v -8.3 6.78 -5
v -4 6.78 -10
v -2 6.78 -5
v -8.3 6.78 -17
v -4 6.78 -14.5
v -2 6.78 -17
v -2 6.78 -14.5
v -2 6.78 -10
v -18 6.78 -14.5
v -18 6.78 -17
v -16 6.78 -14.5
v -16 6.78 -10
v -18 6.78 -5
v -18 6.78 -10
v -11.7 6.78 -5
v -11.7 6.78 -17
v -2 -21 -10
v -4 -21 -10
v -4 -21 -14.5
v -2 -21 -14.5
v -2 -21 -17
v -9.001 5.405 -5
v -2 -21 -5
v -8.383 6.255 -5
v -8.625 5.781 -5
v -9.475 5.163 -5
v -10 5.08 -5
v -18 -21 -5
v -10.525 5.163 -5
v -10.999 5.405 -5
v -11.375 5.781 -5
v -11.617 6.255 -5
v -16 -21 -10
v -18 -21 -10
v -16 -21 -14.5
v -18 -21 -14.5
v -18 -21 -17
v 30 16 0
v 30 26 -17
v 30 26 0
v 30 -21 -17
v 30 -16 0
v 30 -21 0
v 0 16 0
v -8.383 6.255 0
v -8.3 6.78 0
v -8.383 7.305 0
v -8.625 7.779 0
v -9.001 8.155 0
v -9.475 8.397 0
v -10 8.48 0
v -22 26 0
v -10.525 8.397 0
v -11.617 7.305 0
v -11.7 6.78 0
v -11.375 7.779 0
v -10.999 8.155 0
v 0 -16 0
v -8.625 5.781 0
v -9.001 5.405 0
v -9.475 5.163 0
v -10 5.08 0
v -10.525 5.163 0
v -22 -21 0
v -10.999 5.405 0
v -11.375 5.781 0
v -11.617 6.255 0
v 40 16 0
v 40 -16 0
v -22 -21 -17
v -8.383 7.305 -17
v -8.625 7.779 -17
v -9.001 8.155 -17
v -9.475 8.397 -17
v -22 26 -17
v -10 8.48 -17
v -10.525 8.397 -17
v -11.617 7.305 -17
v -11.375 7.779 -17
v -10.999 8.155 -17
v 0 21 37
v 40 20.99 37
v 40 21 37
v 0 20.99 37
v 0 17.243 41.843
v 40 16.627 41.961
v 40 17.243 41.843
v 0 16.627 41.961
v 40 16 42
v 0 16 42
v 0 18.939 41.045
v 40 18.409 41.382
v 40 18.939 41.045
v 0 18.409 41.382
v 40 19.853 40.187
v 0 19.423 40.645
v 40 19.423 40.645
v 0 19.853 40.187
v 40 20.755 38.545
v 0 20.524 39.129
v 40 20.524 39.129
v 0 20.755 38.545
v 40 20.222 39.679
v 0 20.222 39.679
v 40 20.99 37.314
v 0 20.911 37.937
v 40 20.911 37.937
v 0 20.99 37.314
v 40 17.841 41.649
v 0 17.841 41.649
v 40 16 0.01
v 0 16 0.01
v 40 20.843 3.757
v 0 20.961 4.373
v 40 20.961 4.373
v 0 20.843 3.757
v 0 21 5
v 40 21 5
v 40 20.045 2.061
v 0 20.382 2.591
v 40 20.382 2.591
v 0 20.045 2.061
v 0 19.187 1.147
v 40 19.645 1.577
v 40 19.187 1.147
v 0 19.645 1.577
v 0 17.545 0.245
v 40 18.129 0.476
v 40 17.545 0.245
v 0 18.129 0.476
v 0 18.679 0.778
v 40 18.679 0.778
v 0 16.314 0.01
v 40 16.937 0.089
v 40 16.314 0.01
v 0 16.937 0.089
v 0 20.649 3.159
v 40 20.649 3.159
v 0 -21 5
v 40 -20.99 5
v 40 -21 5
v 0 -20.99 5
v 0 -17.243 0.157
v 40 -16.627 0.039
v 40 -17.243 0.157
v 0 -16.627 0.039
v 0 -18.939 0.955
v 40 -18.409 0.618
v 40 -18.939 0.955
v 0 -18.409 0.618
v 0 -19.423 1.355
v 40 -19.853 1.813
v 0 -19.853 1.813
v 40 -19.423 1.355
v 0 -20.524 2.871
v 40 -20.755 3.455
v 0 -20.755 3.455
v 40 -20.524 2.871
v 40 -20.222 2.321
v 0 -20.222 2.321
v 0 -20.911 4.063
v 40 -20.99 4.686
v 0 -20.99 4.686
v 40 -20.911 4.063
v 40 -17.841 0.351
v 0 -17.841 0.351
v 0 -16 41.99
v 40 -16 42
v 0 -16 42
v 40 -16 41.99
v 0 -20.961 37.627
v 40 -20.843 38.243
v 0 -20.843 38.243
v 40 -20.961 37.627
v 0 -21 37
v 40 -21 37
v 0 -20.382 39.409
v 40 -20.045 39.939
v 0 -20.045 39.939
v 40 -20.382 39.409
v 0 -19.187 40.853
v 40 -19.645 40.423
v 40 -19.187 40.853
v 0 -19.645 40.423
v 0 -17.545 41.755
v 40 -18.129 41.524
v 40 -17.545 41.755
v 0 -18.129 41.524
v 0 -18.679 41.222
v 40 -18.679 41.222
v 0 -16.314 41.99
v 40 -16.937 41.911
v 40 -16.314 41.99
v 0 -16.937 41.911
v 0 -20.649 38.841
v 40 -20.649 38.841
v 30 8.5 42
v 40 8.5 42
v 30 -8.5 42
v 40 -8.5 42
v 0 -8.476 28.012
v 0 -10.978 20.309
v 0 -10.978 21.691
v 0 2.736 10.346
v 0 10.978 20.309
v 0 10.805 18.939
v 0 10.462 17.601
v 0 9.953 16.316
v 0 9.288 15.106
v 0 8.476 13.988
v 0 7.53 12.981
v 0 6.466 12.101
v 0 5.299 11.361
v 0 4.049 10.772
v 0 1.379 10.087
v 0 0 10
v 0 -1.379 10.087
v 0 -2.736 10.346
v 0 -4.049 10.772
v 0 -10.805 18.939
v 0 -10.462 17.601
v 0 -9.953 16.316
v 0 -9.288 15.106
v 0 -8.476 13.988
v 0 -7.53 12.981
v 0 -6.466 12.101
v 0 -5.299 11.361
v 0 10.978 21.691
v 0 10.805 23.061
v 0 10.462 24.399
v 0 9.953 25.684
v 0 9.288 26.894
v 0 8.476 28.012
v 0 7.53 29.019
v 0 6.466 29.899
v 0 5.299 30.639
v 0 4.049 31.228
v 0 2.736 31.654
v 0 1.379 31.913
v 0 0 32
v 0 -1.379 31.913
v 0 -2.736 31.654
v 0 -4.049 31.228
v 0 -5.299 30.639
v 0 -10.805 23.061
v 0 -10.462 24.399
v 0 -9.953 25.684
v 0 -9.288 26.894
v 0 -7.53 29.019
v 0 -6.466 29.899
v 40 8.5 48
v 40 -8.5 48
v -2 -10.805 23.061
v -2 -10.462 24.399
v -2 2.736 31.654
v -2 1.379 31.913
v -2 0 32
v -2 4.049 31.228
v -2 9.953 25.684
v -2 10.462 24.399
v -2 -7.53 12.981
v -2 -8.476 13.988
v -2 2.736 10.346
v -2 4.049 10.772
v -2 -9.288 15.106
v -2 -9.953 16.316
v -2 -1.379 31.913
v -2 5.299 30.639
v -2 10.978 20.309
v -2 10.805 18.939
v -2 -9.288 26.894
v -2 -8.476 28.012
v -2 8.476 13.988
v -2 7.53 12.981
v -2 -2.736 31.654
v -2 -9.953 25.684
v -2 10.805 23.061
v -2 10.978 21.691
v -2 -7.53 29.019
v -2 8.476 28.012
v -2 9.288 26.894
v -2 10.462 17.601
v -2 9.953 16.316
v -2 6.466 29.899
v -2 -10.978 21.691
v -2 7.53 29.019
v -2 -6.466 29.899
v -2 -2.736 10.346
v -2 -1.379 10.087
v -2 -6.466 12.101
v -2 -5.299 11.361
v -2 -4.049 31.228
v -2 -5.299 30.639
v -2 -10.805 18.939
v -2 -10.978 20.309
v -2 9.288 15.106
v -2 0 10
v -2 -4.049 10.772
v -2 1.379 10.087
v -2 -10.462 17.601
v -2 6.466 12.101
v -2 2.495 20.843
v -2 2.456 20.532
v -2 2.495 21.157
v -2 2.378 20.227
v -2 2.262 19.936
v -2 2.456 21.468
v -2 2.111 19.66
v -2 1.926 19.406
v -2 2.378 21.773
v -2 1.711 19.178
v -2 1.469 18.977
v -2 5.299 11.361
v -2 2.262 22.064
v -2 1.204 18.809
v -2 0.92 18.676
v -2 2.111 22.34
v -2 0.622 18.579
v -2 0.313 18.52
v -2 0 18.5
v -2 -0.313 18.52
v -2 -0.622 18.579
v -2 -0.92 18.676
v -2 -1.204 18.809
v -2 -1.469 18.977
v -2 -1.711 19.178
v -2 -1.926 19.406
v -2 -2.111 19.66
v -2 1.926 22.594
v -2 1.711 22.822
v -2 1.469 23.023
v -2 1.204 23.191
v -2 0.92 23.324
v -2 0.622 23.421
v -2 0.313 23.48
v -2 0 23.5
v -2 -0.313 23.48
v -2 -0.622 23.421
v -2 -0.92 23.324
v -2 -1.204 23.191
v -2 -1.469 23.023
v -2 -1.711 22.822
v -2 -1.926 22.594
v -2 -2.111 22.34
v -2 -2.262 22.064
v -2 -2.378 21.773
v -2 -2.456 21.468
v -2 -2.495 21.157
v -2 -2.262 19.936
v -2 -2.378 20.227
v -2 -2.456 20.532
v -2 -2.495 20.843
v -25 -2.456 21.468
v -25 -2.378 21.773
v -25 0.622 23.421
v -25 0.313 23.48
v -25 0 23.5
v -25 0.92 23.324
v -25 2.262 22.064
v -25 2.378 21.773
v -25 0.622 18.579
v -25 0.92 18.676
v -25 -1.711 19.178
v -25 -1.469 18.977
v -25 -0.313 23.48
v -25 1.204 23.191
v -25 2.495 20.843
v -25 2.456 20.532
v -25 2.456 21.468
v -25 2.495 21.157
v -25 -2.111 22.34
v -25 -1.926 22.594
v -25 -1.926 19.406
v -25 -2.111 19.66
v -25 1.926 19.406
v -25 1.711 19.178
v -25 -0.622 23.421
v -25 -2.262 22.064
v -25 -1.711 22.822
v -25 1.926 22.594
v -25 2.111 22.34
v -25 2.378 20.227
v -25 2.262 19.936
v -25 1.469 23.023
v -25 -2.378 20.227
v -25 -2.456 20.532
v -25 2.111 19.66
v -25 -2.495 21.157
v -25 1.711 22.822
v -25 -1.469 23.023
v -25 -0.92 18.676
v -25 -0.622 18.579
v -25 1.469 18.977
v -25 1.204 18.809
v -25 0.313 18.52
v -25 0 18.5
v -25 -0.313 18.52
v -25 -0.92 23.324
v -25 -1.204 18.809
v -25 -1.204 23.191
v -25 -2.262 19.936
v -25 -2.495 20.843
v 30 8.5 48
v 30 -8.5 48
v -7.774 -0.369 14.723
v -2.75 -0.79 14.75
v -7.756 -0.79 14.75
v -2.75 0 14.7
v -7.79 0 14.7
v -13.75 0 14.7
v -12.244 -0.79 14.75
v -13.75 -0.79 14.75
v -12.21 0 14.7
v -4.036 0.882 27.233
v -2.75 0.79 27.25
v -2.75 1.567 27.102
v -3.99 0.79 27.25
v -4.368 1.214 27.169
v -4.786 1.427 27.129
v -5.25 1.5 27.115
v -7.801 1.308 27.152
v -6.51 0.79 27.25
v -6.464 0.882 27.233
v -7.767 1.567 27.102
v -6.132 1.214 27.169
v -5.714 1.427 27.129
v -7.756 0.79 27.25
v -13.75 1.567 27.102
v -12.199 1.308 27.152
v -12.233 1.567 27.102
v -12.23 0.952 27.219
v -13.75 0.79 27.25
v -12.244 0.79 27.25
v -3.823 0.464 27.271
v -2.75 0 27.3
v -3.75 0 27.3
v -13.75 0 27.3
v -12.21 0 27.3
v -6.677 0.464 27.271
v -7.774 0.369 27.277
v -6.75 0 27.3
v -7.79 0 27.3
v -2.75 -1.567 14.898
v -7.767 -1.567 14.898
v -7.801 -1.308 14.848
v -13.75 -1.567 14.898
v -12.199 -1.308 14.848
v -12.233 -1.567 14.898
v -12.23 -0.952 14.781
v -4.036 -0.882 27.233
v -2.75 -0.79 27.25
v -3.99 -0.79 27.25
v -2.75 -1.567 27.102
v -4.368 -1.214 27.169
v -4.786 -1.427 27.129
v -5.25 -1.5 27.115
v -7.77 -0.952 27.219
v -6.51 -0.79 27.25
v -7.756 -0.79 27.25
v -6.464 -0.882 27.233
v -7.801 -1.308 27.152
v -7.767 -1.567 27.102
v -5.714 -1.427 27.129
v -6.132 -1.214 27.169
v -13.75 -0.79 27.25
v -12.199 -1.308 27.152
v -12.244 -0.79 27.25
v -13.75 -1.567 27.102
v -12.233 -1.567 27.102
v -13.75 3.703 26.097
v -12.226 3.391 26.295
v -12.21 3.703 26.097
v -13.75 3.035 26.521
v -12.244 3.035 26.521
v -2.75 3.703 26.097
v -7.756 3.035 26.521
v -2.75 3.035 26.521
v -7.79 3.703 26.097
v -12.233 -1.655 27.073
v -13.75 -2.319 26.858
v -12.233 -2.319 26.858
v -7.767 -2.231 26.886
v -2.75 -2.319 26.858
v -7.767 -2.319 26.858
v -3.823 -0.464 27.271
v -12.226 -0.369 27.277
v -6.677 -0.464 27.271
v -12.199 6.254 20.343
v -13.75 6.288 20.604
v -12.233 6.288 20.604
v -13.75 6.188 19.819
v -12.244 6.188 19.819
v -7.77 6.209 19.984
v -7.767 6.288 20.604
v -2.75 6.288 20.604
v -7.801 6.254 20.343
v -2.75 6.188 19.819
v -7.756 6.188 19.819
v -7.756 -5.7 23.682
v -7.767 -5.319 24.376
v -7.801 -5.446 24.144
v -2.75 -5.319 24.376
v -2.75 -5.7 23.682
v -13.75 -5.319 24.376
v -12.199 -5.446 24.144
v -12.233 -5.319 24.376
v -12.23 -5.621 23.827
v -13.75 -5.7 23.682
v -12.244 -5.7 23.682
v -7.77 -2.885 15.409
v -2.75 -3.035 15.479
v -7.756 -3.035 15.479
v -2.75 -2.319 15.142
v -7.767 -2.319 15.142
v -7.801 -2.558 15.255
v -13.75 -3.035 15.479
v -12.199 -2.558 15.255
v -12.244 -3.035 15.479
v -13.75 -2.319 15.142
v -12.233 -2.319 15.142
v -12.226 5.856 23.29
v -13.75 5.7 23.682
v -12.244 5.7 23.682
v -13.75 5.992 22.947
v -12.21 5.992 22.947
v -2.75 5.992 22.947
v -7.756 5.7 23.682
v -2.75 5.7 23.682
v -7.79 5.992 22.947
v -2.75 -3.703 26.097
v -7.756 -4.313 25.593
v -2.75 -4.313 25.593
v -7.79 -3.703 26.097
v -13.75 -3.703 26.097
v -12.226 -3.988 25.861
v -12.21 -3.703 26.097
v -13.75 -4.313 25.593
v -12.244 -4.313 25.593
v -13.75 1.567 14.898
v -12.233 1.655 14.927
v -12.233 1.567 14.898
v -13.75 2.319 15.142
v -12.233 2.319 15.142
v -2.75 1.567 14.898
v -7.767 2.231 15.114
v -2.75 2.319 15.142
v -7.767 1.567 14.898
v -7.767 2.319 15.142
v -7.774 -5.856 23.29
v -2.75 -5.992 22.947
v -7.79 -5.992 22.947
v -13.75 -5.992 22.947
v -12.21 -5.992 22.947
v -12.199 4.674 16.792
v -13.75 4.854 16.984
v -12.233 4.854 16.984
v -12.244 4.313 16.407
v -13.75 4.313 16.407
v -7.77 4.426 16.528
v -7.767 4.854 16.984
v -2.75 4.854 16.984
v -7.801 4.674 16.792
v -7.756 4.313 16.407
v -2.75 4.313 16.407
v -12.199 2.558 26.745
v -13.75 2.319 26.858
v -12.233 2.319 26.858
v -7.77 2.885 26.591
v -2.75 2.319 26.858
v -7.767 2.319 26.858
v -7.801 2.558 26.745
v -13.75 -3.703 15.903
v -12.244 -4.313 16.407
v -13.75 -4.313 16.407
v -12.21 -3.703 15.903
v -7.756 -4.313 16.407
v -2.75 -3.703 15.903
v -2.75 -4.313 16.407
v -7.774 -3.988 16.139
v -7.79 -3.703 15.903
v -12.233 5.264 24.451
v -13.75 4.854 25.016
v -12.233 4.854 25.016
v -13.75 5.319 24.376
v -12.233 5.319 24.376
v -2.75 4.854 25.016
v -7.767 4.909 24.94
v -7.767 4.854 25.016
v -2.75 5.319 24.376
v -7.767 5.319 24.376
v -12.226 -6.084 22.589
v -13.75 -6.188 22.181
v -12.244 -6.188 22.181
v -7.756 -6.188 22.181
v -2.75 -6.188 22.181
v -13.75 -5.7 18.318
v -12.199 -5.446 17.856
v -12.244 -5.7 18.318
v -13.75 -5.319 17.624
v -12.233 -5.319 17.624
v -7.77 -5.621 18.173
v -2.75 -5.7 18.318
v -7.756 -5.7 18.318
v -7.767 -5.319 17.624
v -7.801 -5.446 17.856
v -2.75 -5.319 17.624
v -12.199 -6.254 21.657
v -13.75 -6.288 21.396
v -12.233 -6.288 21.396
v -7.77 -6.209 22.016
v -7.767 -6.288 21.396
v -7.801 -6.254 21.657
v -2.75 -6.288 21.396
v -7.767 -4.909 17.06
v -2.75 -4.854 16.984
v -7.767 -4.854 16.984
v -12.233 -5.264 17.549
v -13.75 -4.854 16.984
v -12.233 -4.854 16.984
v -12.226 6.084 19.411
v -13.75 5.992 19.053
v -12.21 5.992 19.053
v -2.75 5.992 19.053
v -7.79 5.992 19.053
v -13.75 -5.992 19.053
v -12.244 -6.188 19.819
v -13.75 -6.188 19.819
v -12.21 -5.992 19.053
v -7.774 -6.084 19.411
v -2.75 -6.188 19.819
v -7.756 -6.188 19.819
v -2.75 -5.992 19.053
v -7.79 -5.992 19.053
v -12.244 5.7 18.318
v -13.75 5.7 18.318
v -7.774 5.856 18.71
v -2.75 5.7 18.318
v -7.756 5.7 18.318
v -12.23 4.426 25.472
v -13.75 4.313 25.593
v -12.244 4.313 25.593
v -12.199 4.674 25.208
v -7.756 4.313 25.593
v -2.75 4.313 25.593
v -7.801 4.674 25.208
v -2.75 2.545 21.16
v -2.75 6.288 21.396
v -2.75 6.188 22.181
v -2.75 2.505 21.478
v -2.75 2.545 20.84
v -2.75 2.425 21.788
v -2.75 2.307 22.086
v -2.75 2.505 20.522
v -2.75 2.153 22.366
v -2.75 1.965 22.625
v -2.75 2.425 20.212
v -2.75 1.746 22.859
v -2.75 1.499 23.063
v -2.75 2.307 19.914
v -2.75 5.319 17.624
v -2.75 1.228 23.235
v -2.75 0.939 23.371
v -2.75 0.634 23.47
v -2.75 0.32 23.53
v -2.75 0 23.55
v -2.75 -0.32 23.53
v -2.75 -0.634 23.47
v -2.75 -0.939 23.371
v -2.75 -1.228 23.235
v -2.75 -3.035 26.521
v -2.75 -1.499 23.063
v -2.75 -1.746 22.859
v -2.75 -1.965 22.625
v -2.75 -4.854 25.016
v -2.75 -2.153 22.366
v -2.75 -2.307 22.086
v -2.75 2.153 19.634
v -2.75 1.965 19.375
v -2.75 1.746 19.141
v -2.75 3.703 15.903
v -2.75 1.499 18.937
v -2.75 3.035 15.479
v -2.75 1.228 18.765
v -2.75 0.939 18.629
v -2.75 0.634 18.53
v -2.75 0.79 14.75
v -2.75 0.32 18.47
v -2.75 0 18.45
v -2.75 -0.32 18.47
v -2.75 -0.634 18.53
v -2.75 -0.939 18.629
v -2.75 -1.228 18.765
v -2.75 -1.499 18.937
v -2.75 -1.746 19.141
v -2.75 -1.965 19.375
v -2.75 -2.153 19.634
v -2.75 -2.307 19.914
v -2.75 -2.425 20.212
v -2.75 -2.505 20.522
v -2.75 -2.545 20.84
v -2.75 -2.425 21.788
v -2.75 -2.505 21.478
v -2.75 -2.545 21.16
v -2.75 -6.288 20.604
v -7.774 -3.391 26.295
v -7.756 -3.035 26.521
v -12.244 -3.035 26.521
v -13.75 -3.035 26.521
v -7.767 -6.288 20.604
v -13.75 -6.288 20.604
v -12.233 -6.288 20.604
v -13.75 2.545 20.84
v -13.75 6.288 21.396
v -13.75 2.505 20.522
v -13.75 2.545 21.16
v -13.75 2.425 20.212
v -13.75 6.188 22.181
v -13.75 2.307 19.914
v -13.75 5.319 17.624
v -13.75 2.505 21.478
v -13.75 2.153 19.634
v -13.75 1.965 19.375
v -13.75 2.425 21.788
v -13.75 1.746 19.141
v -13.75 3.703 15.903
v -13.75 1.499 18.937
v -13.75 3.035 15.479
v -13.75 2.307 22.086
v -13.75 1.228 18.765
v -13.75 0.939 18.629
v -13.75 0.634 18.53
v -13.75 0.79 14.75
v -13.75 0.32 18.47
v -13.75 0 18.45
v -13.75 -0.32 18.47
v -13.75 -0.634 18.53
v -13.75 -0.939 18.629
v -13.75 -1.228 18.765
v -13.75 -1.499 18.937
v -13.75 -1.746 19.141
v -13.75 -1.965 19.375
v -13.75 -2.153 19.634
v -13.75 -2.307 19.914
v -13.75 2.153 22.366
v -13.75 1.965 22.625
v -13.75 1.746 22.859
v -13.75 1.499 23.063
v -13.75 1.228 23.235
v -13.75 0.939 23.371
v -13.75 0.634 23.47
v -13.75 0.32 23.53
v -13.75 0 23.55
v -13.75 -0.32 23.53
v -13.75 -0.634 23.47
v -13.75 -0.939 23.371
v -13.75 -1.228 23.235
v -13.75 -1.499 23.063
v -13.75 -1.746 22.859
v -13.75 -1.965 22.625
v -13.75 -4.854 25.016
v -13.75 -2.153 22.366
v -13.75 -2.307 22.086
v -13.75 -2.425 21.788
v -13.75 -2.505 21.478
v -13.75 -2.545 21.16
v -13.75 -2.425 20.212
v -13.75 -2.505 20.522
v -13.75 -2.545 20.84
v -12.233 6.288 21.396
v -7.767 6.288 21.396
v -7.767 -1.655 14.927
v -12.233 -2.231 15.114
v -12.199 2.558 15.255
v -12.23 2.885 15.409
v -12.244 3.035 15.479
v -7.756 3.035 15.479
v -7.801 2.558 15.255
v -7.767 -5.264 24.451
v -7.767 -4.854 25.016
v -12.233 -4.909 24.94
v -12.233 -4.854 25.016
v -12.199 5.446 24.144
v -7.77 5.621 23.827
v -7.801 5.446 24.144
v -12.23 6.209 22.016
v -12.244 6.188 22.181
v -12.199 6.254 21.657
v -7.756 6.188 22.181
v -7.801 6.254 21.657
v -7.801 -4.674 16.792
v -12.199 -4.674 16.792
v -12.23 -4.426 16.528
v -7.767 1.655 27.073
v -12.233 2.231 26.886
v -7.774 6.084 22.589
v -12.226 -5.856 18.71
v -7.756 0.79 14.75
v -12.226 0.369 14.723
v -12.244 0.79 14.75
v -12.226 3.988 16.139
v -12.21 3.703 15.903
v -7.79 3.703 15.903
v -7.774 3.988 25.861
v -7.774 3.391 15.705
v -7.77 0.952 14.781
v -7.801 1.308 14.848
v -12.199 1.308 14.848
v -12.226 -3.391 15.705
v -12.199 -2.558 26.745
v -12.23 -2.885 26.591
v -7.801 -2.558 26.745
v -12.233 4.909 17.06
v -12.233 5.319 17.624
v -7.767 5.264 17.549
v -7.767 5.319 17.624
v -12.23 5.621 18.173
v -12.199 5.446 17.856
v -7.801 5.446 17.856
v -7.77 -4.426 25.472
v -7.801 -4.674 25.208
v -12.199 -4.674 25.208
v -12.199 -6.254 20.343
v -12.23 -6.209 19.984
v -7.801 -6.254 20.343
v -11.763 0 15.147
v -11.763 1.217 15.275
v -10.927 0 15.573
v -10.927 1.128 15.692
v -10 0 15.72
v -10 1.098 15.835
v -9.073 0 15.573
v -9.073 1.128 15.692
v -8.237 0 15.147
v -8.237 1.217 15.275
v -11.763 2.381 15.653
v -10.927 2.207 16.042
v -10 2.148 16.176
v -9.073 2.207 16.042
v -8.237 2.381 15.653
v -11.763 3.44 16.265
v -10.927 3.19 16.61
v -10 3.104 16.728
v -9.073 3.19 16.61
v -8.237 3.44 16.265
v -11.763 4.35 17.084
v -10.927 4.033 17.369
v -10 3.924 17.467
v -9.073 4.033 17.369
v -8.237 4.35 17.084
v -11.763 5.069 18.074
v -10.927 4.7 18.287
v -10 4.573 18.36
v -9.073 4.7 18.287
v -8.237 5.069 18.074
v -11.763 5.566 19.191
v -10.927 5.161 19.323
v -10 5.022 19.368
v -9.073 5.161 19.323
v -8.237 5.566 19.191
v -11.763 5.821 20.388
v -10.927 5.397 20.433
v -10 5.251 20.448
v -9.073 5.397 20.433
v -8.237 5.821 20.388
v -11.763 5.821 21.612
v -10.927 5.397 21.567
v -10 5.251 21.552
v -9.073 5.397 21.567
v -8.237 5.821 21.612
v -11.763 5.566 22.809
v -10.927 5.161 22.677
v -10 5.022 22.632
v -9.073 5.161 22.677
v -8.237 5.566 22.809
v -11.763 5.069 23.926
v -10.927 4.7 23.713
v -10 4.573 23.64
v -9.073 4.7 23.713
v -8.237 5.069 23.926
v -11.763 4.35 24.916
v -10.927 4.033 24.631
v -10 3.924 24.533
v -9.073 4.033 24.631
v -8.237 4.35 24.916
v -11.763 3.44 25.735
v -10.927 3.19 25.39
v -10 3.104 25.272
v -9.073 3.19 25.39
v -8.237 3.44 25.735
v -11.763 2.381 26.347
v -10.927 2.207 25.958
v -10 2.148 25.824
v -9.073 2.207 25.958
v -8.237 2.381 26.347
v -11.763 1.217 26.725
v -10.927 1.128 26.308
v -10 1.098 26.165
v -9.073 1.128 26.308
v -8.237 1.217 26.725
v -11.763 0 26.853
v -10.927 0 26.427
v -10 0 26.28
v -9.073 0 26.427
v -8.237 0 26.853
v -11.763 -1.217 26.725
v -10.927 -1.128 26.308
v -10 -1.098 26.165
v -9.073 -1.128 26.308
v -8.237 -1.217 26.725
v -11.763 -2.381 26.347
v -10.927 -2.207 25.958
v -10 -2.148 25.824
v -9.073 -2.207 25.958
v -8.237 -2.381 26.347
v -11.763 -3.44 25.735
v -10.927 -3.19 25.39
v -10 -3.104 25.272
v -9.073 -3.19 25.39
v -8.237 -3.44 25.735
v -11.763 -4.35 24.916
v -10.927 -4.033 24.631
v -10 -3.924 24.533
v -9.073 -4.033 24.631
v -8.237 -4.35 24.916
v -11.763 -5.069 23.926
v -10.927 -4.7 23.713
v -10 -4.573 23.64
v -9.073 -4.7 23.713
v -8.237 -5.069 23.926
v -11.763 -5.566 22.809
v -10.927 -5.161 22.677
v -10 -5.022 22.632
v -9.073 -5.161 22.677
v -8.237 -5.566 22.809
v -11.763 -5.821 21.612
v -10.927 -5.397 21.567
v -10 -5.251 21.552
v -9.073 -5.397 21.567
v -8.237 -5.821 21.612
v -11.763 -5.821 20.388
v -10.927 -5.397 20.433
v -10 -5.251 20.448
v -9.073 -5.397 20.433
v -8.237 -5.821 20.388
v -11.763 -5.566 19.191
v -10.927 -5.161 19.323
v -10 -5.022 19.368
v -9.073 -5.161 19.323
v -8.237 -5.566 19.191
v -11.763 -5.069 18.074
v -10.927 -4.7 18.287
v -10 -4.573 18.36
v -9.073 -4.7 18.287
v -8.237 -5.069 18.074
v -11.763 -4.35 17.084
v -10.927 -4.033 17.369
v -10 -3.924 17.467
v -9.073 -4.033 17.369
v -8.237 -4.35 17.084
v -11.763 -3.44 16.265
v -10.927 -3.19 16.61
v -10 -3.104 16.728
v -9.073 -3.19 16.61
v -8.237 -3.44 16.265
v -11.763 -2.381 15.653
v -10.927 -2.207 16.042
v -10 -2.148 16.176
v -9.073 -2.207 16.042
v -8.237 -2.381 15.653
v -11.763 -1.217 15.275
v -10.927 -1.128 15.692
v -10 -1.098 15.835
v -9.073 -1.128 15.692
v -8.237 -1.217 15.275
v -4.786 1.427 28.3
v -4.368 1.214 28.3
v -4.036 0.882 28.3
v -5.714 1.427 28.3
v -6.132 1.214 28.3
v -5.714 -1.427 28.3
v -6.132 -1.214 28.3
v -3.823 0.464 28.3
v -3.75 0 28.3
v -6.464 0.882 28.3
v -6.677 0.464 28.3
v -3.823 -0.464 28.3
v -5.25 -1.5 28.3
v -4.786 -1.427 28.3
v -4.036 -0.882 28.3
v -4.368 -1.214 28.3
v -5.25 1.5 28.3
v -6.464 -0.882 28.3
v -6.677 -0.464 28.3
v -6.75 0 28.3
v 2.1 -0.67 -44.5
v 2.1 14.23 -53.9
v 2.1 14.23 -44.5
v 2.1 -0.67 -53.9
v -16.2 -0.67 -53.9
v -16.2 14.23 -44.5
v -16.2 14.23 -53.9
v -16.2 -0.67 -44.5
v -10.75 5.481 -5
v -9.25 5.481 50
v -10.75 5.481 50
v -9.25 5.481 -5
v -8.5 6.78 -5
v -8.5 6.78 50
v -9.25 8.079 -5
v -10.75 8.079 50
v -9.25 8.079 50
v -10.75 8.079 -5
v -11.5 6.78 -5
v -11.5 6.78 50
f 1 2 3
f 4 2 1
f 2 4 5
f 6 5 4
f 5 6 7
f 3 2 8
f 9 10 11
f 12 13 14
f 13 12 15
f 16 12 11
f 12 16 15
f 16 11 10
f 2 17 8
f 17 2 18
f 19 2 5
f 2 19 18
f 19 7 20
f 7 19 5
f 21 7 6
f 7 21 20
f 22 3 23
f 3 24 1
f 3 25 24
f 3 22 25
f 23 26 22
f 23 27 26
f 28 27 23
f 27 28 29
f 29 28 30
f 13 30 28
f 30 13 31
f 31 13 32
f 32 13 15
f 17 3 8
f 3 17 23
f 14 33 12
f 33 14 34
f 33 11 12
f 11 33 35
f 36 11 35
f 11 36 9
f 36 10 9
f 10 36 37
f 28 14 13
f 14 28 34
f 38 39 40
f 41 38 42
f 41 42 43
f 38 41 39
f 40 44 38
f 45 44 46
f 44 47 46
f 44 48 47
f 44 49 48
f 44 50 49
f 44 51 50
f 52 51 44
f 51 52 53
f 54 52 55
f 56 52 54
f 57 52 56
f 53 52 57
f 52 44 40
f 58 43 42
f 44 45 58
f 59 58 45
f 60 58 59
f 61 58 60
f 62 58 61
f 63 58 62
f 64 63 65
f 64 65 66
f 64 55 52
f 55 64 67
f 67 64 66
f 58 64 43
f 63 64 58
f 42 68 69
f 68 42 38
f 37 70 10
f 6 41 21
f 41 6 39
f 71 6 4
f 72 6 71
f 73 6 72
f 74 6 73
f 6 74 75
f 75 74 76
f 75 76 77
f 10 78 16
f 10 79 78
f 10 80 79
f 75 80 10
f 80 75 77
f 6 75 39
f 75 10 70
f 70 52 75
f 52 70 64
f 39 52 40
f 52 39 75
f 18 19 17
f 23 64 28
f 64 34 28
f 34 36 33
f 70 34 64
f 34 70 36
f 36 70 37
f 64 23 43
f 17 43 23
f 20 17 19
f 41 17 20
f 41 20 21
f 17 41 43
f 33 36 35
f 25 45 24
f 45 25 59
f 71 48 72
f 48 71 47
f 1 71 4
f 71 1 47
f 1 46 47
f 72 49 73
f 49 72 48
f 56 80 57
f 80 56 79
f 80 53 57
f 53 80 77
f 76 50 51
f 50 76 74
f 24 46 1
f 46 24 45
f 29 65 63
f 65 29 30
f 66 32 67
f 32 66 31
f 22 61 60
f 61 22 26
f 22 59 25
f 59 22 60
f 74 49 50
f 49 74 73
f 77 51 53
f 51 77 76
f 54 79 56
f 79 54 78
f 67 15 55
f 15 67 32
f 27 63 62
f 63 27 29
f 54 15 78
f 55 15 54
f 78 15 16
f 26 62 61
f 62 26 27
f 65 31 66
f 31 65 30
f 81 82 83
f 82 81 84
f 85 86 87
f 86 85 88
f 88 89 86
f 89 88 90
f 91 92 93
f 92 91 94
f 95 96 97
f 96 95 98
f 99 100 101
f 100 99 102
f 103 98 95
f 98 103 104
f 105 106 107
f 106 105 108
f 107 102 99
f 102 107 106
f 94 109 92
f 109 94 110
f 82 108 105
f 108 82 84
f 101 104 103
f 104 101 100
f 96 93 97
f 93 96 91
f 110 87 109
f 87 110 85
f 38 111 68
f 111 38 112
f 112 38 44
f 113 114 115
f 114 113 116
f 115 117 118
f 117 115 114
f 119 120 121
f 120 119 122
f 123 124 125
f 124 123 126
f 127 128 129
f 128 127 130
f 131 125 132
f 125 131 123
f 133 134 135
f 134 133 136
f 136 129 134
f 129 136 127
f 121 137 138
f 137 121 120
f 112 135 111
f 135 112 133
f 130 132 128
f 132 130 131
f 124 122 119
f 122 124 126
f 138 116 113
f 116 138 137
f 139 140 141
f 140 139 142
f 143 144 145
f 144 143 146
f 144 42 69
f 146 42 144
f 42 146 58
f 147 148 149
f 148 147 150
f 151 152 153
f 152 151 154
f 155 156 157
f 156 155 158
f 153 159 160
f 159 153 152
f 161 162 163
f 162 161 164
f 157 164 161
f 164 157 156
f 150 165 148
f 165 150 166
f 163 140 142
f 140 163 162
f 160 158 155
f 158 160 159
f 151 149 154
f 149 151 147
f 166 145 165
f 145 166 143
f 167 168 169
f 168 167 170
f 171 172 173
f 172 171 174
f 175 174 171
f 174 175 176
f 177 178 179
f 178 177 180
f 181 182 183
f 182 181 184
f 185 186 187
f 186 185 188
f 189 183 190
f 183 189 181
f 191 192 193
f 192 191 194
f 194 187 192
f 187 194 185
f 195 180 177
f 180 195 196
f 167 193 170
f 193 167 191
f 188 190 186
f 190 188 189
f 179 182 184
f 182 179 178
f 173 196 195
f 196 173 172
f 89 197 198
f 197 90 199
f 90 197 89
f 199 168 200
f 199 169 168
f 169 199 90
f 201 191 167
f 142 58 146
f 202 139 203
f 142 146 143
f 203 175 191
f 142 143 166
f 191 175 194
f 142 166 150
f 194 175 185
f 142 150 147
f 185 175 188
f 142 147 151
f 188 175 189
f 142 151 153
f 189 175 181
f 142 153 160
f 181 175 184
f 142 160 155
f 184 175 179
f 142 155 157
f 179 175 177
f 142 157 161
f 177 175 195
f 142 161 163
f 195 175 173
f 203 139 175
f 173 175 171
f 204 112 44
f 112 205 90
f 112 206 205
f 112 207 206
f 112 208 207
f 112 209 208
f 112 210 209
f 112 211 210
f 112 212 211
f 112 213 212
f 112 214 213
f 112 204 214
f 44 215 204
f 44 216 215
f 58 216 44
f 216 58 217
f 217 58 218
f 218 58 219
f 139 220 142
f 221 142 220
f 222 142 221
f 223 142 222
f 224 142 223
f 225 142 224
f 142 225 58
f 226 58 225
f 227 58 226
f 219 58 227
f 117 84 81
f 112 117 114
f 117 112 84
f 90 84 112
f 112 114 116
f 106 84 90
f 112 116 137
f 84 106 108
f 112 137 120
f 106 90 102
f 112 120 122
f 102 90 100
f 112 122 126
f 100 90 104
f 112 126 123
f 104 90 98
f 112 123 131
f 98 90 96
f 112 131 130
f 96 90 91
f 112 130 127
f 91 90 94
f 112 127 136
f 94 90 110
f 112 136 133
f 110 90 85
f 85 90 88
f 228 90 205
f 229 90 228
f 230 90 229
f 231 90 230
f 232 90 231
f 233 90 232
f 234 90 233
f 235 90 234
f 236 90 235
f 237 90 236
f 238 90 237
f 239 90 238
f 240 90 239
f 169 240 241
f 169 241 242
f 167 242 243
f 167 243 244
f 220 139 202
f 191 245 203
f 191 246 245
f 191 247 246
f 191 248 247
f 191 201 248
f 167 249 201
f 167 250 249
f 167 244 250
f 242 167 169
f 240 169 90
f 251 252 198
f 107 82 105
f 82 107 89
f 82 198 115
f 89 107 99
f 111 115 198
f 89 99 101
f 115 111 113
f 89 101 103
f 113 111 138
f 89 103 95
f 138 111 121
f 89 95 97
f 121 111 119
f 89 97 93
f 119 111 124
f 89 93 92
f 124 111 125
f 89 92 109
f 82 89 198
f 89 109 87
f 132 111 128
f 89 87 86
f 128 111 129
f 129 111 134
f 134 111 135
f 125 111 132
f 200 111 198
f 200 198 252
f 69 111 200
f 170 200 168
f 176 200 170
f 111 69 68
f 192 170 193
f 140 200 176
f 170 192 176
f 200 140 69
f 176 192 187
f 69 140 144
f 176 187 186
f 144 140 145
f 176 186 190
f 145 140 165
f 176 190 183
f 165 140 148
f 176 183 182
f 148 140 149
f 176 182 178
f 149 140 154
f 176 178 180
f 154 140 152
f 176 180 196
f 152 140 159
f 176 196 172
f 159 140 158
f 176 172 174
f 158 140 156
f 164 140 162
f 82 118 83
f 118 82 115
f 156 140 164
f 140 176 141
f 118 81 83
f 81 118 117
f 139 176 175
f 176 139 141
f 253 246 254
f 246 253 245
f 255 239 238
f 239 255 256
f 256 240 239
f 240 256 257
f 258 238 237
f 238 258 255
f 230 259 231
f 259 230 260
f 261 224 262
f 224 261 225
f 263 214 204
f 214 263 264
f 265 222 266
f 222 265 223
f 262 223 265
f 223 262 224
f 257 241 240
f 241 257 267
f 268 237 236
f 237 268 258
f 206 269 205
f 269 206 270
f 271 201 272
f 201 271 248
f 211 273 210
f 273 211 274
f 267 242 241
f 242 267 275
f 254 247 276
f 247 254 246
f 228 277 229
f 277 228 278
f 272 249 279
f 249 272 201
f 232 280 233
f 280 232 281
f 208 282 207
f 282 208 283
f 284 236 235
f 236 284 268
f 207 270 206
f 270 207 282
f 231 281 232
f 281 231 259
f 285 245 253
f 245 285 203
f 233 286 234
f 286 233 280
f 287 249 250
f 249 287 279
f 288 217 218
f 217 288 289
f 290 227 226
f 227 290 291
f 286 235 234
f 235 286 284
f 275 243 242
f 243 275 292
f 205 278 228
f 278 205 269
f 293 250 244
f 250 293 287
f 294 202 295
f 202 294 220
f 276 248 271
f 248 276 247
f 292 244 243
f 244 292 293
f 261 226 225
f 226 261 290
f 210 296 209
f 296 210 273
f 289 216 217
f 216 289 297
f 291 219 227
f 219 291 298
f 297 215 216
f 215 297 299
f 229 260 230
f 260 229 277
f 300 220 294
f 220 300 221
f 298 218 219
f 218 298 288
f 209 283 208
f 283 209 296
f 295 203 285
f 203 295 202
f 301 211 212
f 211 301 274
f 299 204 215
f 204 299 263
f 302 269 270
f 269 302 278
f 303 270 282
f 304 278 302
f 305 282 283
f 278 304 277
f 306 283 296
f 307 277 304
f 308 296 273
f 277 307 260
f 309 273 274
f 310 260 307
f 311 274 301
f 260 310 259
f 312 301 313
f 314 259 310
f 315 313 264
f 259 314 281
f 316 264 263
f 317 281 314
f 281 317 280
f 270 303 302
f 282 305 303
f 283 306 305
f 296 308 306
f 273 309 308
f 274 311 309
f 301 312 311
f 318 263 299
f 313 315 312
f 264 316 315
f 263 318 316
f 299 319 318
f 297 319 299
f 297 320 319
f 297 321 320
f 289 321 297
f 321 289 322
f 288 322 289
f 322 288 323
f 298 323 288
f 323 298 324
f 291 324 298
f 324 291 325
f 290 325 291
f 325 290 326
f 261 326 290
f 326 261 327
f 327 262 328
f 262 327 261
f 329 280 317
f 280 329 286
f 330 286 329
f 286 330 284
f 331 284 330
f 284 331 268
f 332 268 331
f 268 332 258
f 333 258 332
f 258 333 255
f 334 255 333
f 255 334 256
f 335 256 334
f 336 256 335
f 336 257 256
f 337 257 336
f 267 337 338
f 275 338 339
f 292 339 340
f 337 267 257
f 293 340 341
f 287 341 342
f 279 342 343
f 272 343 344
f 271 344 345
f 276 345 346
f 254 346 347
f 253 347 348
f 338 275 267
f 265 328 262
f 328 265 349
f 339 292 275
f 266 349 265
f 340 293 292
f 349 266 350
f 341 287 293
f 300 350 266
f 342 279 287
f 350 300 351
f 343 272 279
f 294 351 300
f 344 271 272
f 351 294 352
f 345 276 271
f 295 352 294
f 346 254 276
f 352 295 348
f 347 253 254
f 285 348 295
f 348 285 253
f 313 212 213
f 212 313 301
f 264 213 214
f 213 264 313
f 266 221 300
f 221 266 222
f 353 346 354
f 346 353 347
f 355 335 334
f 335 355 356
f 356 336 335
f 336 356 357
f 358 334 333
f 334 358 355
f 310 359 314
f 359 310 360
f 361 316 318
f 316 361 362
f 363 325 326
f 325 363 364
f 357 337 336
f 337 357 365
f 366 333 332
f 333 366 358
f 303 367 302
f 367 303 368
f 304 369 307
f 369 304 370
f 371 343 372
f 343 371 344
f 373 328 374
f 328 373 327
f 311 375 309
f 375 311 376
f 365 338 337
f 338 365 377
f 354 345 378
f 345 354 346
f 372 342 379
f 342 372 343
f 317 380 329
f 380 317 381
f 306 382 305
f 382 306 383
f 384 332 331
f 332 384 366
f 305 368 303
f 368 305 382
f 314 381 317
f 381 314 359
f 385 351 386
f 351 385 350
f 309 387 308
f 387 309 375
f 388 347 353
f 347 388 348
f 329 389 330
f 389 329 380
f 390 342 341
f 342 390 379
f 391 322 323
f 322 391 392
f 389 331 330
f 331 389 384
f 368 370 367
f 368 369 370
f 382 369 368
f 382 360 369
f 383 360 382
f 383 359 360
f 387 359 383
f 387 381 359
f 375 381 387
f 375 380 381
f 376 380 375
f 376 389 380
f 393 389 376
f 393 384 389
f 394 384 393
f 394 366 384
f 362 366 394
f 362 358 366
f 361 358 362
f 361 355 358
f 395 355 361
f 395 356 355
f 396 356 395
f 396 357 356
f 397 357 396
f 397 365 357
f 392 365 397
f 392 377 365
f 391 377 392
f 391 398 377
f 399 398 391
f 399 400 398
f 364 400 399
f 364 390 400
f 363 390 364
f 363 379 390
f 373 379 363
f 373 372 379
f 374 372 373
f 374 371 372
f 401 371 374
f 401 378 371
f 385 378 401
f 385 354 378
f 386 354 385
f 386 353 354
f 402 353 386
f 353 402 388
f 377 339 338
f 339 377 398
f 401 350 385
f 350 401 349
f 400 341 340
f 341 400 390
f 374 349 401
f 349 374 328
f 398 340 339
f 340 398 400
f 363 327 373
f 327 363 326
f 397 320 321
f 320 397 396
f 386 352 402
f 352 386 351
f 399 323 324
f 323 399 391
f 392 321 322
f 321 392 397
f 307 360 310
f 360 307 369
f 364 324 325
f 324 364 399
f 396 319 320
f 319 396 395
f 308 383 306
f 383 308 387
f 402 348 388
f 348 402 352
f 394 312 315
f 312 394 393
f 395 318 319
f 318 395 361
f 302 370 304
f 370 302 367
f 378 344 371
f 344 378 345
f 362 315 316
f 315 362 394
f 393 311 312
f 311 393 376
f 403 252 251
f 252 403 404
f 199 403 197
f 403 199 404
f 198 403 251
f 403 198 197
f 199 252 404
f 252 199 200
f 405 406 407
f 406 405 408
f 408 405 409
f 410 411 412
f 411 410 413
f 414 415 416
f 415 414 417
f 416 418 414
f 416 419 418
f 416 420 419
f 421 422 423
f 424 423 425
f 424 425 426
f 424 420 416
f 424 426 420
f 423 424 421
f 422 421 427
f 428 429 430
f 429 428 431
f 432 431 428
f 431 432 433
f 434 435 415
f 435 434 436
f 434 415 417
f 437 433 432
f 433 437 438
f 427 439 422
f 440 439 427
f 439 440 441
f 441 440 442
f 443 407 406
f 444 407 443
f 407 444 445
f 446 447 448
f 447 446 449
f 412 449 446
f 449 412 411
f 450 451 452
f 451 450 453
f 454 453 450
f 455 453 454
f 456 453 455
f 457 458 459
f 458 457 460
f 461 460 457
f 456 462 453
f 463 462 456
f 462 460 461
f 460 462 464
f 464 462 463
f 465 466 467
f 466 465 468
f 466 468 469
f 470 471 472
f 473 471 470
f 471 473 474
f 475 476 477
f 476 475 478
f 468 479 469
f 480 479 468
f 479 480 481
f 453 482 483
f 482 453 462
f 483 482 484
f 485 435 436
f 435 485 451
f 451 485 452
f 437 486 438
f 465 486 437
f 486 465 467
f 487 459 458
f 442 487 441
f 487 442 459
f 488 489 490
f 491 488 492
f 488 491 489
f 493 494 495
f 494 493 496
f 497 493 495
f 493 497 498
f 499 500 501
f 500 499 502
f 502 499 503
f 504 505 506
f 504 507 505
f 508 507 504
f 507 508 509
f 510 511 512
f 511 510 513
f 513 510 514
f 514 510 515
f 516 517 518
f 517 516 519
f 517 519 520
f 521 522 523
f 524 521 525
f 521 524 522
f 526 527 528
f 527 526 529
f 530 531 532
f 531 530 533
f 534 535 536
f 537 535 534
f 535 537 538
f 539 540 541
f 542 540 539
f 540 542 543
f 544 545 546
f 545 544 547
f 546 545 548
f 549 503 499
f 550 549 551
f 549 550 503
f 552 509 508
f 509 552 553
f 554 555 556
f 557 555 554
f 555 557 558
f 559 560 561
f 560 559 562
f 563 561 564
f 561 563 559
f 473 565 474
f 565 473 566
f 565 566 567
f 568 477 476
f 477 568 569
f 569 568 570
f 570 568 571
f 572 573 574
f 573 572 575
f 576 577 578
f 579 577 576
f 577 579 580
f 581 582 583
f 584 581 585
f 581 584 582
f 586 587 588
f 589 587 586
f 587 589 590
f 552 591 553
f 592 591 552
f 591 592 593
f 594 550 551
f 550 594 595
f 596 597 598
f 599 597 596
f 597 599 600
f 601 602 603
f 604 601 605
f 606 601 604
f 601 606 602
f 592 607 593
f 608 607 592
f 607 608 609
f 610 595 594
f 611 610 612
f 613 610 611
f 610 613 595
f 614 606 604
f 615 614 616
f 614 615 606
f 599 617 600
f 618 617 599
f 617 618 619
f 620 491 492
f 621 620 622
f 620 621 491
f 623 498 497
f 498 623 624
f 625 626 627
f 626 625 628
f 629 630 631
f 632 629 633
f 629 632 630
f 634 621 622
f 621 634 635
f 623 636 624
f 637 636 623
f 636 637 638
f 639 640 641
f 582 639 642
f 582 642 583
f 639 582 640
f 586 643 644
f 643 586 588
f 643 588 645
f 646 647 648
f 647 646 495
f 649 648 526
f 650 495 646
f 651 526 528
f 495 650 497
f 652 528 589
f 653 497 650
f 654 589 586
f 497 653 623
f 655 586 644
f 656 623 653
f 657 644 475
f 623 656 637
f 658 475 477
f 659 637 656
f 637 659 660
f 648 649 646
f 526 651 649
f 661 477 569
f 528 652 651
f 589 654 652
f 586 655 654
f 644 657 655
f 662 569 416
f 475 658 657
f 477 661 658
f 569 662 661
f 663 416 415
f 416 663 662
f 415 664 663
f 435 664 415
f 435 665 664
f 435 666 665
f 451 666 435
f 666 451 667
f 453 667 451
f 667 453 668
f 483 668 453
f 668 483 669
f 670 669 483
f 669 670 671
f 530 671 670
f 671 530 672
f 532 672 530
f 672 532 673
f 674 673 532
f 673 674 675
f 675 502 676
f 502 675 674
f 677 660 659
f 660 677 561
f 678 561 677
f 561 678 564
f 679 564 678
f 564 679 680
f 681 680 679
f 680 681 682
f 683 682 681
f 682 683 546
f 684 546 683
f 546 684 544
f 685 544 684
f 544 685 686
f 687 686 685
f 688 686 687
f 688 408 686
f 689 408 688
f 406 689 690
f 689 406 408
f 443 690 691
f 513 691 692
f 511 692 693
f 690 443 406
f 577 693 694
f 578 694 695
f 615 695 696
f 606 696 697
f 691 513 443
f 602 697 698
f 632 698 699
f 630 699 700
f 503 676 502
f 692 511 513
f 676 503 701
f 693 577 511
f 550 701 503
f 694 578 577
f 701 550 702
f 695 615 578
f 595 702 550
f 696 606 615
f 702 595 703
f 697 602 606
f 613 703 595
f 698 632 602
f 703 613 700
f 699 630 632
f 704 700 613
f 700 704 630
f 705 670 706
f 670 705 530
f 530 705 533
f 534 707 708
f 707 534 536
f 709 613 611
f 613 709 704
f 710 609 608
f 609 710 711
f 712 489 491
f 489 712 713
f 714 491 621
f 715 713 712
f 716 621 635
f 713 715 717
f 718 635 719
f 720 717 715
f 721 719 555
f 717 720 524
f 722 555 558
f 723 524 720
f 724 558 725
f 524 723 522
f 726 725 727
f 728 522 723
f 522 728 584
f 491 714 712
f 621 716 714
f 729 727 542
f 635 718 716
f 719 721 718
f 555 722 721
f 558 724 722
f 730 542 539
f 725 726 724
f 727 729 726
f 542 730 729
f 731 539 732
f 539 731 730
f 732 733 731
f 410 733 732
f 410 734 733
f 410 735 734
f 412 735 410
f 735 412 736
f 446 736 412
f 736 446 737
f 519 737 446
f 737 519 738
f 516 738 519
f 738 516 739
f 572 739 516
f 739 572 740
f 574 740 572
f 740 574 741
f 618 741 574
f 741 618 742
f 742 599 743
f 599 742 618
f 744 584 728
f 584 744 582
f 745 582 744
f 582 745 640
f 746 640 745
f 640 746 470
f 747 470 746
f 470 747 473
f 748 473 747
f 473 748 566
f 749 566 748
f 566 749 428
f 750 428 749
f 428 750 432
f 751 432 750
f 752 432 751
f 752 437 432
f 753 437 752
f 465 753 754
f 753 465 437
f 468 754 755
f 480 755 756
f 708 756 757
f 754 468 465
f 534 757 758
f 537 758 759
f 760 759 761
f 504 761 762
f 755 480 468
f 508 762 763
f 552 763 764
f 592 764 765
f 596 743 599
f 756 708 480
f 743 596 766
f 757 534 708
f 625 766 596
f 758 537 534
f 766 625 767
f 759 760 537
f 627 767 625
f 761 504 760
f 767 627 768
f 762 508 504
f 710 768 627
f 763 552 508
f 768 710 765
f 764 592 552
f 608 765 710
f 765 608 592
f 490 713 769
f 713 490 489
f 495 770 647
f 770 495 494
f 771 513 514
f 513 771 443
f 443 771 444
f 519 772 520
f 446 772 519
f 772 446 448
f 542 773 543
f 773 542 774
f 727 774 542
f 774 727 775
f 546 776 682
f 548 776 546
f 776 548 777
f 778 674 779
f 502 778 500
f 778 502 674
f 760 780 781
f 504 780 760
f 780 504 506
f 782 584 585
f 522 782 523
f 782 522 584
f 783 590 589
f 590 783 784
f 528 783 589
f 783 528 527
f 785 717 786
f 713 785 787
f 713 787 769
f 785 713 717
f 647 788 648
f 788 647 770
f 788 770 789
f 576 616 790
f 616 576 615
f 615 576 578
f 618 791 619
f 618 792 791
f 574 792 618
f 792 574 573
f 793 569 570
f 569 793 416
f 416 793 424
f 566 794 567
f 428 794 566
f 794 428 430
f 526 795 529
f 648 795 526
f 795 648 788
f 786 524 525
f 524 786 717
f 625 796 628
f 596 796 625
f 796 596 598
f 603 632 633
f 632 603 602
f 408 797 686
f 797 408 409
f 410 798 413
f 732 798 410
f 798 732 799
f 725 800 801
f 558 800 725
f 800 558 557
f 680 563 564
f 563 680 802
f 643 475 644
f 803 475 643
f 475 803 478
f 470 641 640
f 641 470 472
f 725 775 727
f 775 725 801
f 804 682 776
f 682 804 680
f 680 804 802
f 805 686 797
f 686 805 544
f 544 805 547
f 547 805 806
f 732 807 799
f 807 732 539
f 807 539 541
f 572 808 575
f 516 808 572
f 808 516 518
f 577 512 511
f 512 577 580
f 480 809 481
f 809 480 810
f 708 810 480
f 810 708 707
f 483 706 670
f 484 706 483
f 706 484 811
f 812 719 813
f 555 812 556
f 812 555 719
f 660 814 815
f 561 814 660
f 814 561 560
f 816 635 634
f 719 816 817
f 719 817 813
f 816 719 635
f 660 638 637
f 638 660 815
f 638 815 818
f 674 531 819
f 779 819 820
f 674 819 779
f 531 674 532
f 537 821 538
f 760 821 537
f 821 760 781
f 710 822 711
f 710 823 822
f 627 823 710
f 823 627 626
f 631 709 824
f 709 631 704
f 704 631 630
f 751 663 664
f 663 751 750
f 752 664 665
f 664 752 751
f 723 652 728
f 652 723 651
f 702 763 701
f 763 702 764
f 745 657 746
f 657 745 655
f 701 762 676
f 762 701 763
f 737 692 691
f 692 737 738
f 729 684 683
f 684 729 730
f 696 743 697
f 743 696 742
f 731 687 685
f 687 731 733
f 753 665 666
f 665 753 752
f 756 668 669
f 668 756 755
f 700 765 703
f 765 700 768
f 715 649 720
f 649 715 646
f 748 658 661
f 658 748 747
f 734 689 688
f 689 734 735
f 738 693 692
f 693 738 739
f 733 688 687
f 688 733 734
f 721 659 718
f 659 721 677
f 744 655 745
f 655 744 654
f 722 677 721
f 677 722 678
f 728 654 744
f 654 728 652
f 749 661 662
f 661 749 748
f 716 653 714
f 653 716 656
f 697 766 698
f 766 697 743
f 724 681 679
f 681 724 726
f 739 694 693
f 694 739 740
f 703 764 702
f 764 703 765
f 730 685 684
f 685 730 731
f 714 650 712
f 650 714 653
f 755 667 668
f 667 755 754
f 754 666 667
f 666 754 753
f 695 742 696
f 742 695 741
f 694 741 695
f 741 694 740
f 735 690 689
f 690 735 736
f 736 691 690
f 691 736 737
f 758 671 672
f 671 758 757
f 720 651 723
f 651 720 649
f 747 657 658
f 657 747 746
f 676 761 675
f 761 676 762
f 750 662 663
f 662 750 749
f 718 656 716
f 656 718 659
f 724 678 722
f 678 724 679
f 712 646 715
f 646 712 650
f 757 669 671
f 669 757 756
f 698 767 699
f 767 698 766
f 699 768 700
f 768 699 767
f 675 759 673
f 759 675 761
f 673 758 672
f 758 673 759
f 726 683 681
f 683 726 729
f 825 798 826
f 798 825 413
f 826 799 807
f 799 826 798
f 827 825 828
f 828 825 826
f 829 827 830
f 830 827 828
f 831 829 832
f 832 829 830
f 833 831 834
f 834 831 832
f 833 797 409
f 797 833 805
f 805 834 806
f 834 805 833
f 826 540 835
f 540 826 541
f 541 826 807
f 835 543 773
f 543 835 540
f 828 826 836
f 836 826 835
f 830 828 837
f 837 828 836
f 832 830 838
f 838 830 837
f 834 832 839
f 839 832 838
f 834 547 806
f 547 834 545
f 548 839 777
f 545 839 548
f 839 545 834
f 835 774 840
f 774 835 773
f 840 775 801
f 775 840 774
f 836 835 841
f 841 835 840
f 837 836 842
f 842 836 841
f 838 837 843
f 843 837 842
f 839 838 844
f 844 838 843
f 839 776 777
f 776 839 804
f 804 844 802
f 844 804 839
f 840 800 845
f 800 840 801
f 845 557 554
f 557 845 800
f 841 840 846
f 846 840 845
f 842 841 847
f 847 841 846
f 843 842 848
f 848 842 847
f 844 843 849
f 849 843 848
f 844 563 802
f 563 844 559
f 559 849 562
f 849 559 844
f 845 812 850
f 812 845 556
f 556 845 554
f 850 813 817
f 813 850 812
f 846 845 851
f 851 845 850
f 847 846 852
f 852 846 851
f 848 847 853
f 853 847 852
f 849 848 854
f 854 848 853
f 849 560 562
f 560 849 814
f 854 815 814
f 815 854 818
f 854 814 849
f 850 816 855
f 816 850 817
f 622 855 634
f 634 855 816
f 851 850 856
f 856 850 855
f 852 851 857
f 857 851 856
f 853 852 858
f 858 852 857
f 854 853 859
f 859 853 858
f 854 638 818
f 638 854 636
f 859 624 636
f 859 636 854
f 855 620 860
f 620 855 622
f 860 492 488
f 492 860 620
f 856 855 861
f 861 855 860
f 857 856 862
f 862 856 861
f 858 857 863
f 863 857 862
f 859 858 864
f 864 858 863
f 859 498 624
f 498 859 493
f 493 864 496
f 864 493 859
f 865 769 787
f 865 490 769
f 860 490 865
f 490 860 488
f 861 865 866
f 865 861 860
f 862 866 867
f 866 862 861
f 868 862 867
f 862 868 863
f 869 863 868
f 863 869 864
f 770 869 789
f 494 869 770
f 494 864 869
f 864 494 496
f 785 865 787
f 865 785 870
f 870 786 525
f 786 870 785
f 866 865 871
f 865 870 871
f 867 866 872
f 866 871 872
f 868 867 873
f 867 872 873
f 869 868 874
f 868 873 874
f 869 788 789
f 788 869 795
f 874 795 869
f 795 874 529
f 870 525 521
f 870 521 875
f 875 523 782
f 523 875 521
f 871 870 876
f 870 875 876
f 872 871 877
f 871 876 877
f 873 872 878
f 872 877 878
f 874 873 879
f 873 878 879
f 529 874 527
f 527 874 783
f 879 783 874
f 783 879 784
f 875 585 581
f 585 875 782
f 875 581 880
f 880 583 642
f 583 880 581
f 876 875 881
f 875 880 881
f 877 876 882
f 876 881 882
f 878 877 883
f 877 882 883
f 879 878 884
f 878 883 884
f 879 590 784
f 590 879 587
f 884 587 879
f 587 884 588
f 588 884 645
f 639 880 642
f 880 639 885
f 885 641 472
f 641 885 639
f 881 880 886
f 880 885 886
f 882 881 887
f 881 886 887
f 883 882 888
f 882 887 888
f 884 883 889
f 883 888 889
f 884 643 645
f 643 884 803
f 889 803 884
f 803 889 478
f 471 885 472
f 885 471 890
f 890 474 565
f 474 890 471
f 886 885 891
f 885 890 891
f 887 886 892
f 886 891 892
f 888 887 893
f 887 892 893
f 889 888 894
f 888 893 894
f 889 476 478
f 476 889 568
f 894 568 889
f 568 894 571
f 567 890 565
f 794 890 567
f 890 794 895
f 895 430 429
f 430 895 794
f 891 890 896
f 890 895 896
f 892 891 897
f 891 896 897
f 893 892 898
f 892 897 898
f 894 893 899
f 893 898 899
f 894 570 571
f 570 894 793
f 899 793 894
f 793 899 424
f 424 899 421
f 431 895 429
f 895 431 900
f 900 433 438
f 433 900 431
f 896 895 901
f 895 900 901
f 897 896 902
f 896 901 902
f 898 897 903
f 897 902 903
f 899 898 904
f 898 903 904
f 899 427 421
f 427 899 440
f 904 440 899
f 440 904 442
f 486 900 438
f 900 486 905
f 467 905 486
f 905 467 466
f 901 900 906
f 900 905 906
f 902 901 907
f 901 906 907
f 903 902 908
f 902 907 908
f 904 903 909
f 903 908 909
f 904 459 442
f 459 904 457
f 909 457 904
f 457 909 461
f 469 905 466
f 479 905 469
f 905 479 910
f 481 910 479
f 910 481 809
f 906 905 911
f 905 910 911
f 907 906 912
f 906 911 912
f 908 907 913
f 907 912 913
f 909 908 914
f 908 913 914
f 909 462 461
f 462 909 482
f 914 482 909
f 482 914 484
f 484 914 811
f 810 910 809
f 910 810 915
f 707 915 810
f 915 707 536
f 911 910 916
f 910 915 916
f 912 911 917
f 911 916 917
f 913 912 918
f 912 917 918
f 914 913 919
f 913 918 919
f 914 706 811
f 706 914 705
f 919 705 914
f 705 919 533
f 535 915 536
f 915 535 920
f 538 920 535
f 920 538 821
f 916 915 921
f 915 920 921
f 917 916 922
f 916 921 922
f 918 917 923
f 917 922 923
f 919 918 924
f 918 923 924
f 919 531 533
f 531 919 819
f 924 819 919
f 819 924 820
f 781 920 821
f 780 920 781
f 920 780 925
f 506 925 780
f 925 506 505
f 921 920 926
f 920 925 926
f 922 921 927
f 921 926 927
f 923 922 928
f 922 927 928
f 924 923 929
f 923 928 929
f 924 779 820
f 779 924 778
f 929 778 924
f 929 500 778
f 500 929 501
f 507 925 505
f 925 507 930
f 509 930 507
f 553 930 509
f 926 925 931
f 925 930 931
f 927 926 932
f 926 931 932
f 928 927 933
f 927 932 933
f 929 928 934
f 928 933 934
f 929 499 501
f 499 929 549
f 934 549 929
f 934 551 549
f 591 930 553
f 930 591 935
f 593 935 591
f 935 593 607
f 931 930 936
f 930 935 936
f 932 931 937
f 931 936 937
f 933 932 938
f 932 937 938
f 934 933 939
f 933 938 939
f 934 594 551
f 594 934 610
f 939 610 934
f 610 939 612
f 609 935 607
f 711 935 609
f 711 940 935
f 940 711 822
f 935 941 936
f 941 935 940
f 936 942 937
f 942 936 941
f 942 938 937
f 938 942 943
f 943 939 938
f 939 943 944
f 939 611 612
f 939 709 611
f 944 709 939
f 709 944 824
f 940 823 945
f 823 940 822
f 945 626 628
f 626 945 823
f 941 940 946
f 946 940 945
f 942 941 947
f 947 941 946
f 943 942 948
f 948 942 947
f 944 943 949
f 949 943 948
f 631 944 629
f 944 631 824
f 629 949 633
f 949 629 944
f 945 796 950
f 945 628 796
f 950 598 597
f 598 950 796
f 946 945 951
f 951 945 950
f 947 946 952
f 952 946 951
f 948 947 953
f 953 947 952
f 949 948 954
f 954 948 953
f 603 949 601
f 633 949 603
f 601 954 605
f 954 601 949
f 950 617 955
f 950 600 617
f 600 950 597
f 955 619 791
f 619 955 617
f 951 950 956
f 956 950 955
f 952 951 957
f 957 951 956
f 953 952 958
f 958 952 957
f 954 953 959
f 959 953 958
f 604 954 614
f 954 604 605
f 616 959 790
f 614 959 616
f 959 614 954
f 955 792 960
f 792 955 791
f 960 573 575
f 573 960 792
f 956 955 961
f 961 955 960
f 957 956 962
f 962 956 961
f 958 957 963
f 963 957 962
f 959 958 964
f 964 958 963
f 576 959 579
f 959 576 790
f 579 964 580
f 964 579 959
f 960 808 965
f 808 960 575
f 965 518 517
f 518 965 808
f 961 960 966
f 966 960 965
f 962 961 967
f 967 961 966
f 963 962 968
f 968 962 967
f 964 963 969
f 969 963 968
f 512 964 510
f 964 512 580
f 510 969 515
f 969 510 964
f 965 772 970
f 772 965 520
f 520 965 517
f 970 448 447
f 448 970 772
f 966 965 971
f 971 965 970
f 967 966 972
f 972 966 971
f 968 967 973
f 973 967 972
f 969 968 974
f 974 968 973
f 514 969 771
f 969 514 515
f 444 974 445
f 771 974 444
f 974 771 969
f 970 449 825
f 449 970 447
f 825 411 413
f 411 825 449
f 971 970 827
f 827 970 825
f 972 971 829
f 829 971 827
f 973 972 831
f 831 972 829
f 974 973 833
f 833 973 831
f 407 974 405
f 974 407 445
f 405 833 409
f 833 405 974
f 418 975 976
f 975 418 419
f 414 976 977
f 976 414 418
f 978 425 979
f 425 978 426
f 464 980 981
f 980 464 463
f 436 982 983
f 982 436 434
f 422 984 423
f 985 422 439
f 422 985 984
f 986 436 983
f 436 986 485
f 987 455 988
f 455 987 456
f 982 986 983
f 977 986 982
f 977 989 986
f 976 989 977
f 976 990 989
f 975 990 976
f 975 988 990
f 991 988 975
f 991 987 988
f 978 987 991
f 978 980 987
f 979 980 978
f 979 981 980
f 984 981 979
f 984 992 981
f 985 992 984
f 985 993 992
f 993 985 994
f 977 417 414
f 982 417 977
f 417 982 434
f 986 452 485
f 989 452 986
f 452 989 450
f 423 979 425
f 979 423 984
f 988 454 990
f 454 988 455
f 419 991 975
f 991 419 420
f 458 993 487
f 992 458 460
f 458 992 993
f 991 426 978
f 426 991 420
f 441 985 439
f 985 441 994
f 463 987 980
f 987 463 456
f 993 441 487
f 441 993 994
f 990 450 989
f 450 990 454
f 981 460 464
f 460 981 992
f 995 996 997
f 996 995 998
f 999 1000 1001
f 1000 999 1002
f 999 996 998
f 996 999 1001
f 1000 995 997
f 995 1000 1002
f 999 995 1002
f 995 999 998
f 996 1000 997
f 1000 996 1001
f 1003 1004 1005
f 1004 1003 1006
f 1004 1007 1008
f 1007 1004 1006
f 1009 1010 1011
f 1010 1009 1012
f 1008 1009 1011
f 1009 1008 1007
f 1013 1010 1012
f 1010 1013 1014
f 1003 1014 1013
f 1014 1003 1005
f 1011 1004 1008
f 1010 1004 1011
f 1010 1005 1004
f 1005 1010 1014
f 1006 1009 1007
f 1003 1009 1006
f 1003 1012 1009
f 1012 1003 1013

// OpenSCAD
/*parameters*/

/* [Global] */
//Extruder type
extruder_type="j-head"; //["j-head"]
//Filament diameter
filament=3.0; //[3.0, 1.75]
//Generate support
support=1; //[1:Yes, 0:No]
//Pulley type
pulley=0; //[0:"MK7",1:"MK8"]
//Part to generate
part="assemble"; //["all":All parts (print plate), "assemble":Assembled view (demonstrative only) "base":Base, "arm":Arm, "bracket":Extruder bracket plate]


/* [Hidden] */
motor_W=42;
motor_L=40;
motor_shaft_D=5;
motor_shaft_L=23;
motor_flange_D=22;
motor_flange_L=2;
motor_connector_dim=[6,17,10];
motor_hole_spacing=31;
motor_hole_D=3;
motor_fillet_R=5;

pulley_D=12.6 - 4.7*pulley;
pulley_L=11;
pulley_drill_D=5.1;
pulley_effective_D=10.56 - 3.56*pulley;
pulley_teeth_R=3;
pulley_teeth_from_top=3.75;

jhead_rotate_poly=[[-.3,0], [8,0], [8,5], [6,5], [6,9.5], [8,9.5], [8,37], [3.85,41.15], [3.85,52], [0.65,53.6], [-.3,53.6]];
jhead_block_dim=[18.3, 14.9, 9.4];
jhead_block_move=[-12.1,-7.45,39.5];

base_H=17;
base_L=52;
base_motor_L=30;
base_wall_T=5;

hotend_X=-10;
hotend_Z=-5;

bracket_W=1;

module fillet(r, h, pos, rot)
{
	translate(pos)
	rotate(rot)
	translate([-r,-r,0])
		difference()
		{
			translate([0,0,-h/2])
				cube([r*2,r*2,h]);
			cylinder(r=r, h=h+2, center=true);
		}
}

module hotend_base(extr=0)
{
	if (extruder_type=="j-head")
	{
		rotate([0,180,0])
		union()
		{
			rotate_extrude(convexity = 50)
				polygon(jhead_rotate_poly);
			if (extr)
				for(i=[-1,1])
				scale([i,1,1])
				rotate([90,0,0])
				linear_extrude(50)
					polygon(jhead_rotate_poly);
			translate(jhead_block_move)
				cube(jhead_block_dim);
		}
	}
}

module hotend_base_translated(extr=0)
{
	translate([hotend_X,+pulley_effective_D/2+filament/2,hotend_Z])
		hotend_base(extr);
}

module base()
{
	difference()
	{
		translate([base_motor_L-base_L,-motor_W/2,-base_H])
			cube([base_L, motor_W+base_wall_T, base_H]);
		hotend_base_translated(extr=1);
		translate([hotend_X,+pulley_effective_D/2+filament/2,0])
			cylinder(r=filament/2+.2,h=50, center=true, $fn=20);
	}
}

module hotend_bracket()
{
}

module NEMA17_motor()
{
	translate([0,0,motor_L/2])
	union()
	{
		// base
		difference()
		{
			cube([motor_W,motor_W,motor_L], center=true);
			for(angle=[0:90:359])
			{
				rotate([0,0,angle])
					fillet(motor_fillet_R,motor_L+2,[motor_W/2,motor_W/2,0],[0,0,0], $fn=50);
			}
		}
		//flange
		cylinder(r=motor_flange_D/2,h=motor_L/2+motor_flange_L, $fn=50);
		//shaft
		cylinder(r=motor_shaft_D/2,h=motor_L/2+motor_flange_L+motor_shaft_L, $fn=50);
		//connector
		translate([0,-motor_connector_dim[1]/2,-motor_L/2])
			cube([motor_connector_dim[0]+motor_W/2,motor_connector_dim[1],motor_connector_dim[2]]);
	}
}

module MK_pulley()
{
	union()
	{
		difference()
		{
			cylinder(r=pulley_D/2, h=pulley_L, $fn=50);
			cylinder(r=pulley_drill_D/2, h=pulley_L*3, center=true, $fn=50);
			rotate_extrude(convexity = 50)
			translate([pulley_effective_D/2+pulley_teeth_R,pulley_L-pulley_teeth_from_top,0])
				circle(r=pulley_teeth_R, $fn=20);
		}
		//screw
		translate([pulley_D/2,0,2.5])
			rotate([0,90,0])
				cylinder(r=1.5,h=2, center=true,$fn=20);
	}
}


if (part=="assemble")
{
	union()
	{
		base();
		translate([motor_L,0,motor_W/2])
		rotate([0,-90,0])
		union()
		{
			NEMA17_motor();
			translate([0,0,motor_L-hotend_X+pulley_teeth_from_top-pulley_L])
				MK_pulley();
		}
		hotend_base_translated();
		// filament
		translate([hotend_X,+pulley_effective_D/2+filament/2,-5])
			cylinder(r=filament/2,h=55, $fn=6);
	}
}

else if (part=="base")
{
	base();
}
